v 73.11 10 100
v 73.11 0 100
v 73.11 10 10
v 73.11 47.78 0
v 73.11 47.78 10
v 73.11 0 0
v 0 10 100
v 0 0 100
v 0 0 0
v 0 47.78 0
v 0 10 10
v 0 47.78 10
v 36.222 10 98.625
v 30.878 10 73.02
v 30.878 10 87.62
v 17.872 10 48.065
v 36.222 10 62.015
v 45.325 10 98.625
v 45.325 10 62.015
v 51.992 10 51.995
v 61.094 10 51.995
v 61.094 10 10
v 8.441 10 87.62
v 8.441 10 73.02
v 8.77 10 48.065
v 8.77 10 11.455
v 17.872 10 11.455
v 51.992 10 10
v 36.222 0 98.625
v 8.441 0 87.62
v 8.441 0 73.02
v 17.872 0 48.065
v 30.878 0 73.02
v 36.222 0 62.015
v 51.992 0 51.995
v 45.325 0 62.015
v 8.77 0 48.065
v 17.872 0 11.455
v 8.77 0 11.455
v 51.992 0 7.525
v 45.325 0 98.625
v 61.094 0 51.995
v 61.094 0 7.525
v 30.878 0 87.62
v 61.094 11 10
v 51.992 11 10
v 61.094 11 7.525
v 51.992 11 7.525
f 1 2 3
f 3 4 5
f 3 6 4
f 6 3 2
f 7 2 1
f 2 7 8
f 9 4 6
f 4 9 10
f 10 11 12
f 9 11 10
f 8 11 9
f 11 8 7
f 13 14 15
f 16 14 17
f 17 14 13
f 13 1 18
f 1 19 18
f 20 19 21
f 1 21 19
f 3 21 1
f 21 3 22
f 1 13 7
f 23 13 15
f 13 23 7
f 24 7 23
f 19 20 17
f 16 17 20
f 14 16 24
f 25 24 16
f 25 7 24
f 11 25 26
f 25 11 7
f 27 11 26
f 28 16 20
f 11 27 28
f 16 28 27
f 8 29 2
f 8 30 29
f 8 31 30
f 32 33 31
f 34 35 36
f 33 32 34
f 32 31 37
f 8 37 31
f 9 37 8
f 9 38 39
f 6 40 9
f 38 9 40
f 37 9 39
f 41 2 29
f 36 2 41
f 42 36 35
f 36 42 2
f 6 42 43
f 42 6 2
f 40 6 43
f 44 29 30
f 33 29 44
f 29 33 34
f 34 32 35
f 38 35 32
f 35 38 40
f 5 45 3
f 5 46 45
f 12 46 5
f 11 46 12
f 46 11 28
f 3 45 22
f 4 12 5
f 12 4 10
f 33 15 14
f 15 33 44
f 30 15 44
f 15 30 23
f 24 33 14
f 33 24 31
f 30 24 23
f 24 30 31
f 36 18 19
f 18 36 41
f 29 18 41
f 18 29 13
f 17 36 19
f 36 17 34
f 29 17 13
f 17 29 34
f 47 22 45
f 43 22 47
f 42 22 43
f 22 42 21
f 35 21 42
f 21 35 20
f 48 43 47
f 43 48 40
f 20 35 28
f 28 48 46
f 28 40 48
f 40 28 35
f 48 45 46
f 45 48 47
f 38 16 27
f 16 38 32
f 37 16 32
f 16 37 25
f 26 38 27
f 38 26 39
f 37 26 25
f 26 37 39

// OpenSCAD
/* doodle-meta {"version":1,"parameters":{"width":{"label":"Overall width","description":"Changes the body width","unit":"mm","feature":"body_width"},"depth":{"label":"Overall depth","description":"Changes the body depth","unit":"mm","feature":"body_depth"},"height":{"label":"Overall height","description":"Changes the body height","unit":"mm","feature":"body_height"},"thickness":{"label":"Wall thickness","description":"Thickness of the L-shape walls","unit":"mm","feature":"wall_thickness"}},"features":{"body_width":{"kind":"dimension","axis":"x","label":"Overall width"},"body_depth":{"kind":"dimension","axis":"y","label":"Overall depth"},"body_height":{"kind":"dimension","axis":"z","label":"Overall height"},"wall_thickness":{"kind":"dimension","axis":"z","label":"Wall thickness"}}} */

// Parameters
width = 73.11;
depth = 47.78;
height = 100.0;
thickness = 10.0; // Estimated from aspect ratio

// Derived dimensions
base_height = thickness;
backplate_width = thickness;
front_face_width = width;
front_face_height = height;

// Cutout parameters (derived from front view proportions)
// View 2 (Front) mapping: X = u * width, Z = (1-v) * height
// Outer profile bbox in view: [0.0242, 0.0111, 0.9483, 0.9778] -> Width ~0.924, Height ~0.967
// Let's normalize cutout positions relative to the outer profile bounds for robustness.
// Outer profile in view coords:
// u_min = 0.0242, u_max = 0.9665 (approx from polygon) -> span_u = 0.9423
// v_min = 0.0111, v_max = 0.9823 (approx from polygon) -> span_v = 0.9712
// Actual CAD width/height correspond to these spans.
// However, the spec says "measured ink spans x authoritative max dimension".
// The outer profile polygon vertices are roughly:
// (0.0302, 0.0133), (0.0302, 0.9823), (0.9634, 0.98), (0.9665, 0.0177)
// This is a rectangle covering almost the whole view.
// Let's assume the outer profile defines the full width and height of the front face.
// So u=0 maps to X=0, u=1 maps to X=width. v=0 maps to Z=height, v=1 maps to Z=0.

// Cutout 1 (contour_8): Top Left Square-ish
// Center: (0.2689, 0.1968)
// Size: (0.3069, 0.146)
// X_center = 0.2689 * width
// Z_center = (1 - 0.1968) * height
// w = 0.3069 * width
// h = 0.146 * height

// Cutout 2 (contour_10): Top Right Slot
// Center: (0.5577, 0.1968)
// Size: (0.1245, 0.3661)
// X_center = 0.5577 * width
// Z_center = (1 - 0.1968) * height
// w = 0.1245 * width
// h = 0.3661 * height

// Cutout 3 (contour_6): Bottom Right Slot
// Center: (0.7734, 0.7024)
// Size: (0.1245, 0.4447)
// X_center = 0.7734 * width
// Z_center = (1 - 0.7024) * height
// w = 0.1245 * width
// h = 0.4447 * height

// Cutout 4 (contour_4): Bottom Left Slot
// Center: (0.1822, 0.7024)
// Size: (0.1245, 0.3661)
// X_center = 0.1822 * width
// Z_center = (1 - 0.7024) * height
// w = 0.1245 * width
// h = 0.3661 * height

// Helper module for rectangular cutout through Y axis
module rect_cutout(x, z, w, h, depth_cut) {
    // Centered at x, z in XZ plane.
    // Cut along Y.
    // The backplate is at Y=0 to Y=thickness.
    // We need to cut through the backplate.
    // The cutout should be centered on the backplate thickness? 
    // Usually decorative cutouts go through the visible face.
    // The front face is at Y=0 (if we orient the L such that the vertical part is at Y=0..thickness).
    // Wait, let's define the L-shape orientation carefully.
    
    // Right View (View 1) shows the L-profile.
    // View 1 is Right View. u -> +Y, v -> -Z.
    // Polygon: (0.0462, 0.0157) -> (0.0462, 0.9822) -> (0.9394, 0.9866) -> (0.9441, 0.8594) -> (0.3024, 0.855) -> (0.3116, 0.0157)
    // This looks like an L-shape.
    // Let's map it to Y-Z.
    // u=0 is Y=0 (Front of part? No, Right view looks down X. u is Y. u=0 is left of view. 
    // Standard Right View: Looking from +X towards -X. 
    // The "left" of the right view corresponds to the FRONT of the object (Y=0) if we assume standard third angle?
    // Actually, in third angle projection, the Right View is placed to the right of the Front View.
    // The Right View shows the object from the right side.
    // The horizontal axis of the Right View is Depth (Y).
    // Usually, the left side of the Right View corresponds to the Front of the object (Y=0) and the right side to the Back (Y=depth).
    // Let's verify with the polygon.
    // The L-shape has a vertical backplate and a horizontal base.
    // The vertical part is usually at the back (Y=depth) or front?
    // A bookend usually has the vertical part at the back to support books, and the base extends forward.
    // So the vertical wall is at Y=depth-thickness to Y=depth? Or Y=0 to Y=thickness?
    // If the vertical wall is at the back, it's at high Y.
    // Let's look at the polygon in View 1 (Right View).
    // Points:
    // (0.0462, 0.0157) -> Top Left
    // (0.0462, 0.9822) -> Bottom Left
    // (0.9394, 0.9866) -> Bottom Right
    // (0.9441, 0.8594) -> Step Up on Right
    // (0.3024, 0.855) -> Step Left
    // (0.3116, 0.0157) -> Top Right (inner corner)
    
    // This shape is an inverted L? Or standard L?
    // Left side (u~0.05) goes from v~0.01 to v~0.98. This is a tall vertical bar on the LEFT of the view.
    // Bottom side (v~0.98) goes from u~0.05 to u~0.94. This is a wide horizontal bar at the BOTTOM.
    // The "cutout" of the L is at the top right.
    // So the material is on the Left and Bottom of the Right View.
    // If Left of Right View = Front (Y=0), then the vertical wall is at the FRONT (Y=0..thickness).
    // And the base extends to the BACK (Y=0..depth).
    // This is a "front-facing" bookend? Or maybe the view is mirrored?
    // Let's re-read standard mapping.
    // Right View: u maps to +Y.
    // If u=0 is Y=0, then the vertical wall is at Y=0.
    // This means the vertical wall is at the FRONT.
    // The base extends from Y=0 to Y=depth.
    // This is a valid L-shape.
    
    // Now, where are the cutouts?
    // The cutouts are on the "Front Face".
    // If the vertical wall is at Y=0..thickness, the "Front Face" visible from the front (looking down Y) is the face at Y=0?
    // Or is the "Front Face" the large vertical surface?
    // The Front View (View 2) shows the cutouts.
    // The Front View looks down Y.
    // If the vertical wall is at Y=0..thickness, looking from -Y (Front) we see the face at Y=0.
    // So the cutouts go through the wall at Y=0..thickness.
    
    // Let's construct the L-shape:
    // Vertical part: X=0..width, Y=0..thickness, Z=0..height.
    // Horizontal part: X=0..width, Y=0..depth, Z=0..thickness.
    // This forms an L with the corner at (0,0,0).
    // The vertical wall is at the front (Y=0).
    // The base extends backward (Y>0).
    
    // Cutouts are in the vertical wall (Y=0..thickness).
    // They are through-holes along Y.
    
    translate([x, -1, z]) 
        cube([w, depth_cut, h], center=true);
}

// Main Body
difference() {
    // Union of L-shape
    union() {
        // Vertical Backplate (actually Front Plate based on Right View analysis)
        // X: 0 to width
        // Y: 0 to thickness
        // Z: 0 to height
        cube([width, thickness, height]);
        
        // Horizontal Base
        // X: 0 to width
        // Y: 0 to depth
        // Z: 0 to thickness
        // Note: The vertical part already covers Y:0..thickness, Z:0..thickness.
        // So we just add the rest of the base.
        // To avoid overlap issues in CSG (though union handles it), we can just union the two boxes.
        cube([width, depth, thickness]);
    }
    
    // Cutouts
    // All cutouts go through the vertical wall (Y=0..thickness).
    // We need to cut along Y.
    // The cutters should span Y from -eps to thickness+eps.
    
    // Cutout 1: Top Left
    // Center X = 0.2689 * width
    // Center Z = (1 - 0.1968) * height
    // Width = 0.3069 * width
    // Height = 0.146 * height
    c1_x = 0.2689 * width;
    c1_z = (1 - 0.1968) * height;
    c1_w = 0.3069 * width;
    c1_h = 0.146 * height;
    
    translate([c1_x, thickness/2, c1_z])
        cube([c1_w, thickness + 2, c1_h], center=true);
        
    // Cutout 2: Top Right Slot
    // Center X = 0.5577 * width
    // Center Z = (1 - 0.1968) * height
    // Width = 0.1245 * width
    // Height = 0.3661 * height
    c2_x = 0.5577 * width;
    c2_z = (1 - 0.1968) * height;
    c2_w = 0.1245 * width;
    c2_h = 0.3661 * height;
    
    translate([c2_x, thickness/2, c2_z])
        cube([c2_w, thickness + 2, c2_h], center=true);
        
    // Cutout 3: Bottom Right Slot
    // Center X = 0.7734 * width
    // Center Z = (1 - 0.7024) * height
    // Width = 0.1245 * width
    // Height = 0.4447 * height
    c3_x = 0.7734 * width;
    c3_z = (1 - 0.7024) * height;
    c3_w = 0.1245 * width;
    c3_h = 0.4447 * height;
    
    translate([c3_x, thickness/2, c3_z])
        cube([c3_w, thickness + 2, c3_h], center=true);
        
    // Cutout 4: Bottom Left Slot
    // Center X = 0.1822 * width
    // Center Z = (1 - 0.7024) * height
    // Width = 0.1245 * width
    // Height = 0.3661 * height
    c4_x = 0.1822 * width;
    c4_z = (1 - 0.7024) * height;
    c4_w = 0.1245 * width;
    c4_h = 0.3661 * height;
    
    translate([c4_x, thickness/2, c4_z])
        cube([c4_w, thickness + 2, c4_h], center=true);
}
